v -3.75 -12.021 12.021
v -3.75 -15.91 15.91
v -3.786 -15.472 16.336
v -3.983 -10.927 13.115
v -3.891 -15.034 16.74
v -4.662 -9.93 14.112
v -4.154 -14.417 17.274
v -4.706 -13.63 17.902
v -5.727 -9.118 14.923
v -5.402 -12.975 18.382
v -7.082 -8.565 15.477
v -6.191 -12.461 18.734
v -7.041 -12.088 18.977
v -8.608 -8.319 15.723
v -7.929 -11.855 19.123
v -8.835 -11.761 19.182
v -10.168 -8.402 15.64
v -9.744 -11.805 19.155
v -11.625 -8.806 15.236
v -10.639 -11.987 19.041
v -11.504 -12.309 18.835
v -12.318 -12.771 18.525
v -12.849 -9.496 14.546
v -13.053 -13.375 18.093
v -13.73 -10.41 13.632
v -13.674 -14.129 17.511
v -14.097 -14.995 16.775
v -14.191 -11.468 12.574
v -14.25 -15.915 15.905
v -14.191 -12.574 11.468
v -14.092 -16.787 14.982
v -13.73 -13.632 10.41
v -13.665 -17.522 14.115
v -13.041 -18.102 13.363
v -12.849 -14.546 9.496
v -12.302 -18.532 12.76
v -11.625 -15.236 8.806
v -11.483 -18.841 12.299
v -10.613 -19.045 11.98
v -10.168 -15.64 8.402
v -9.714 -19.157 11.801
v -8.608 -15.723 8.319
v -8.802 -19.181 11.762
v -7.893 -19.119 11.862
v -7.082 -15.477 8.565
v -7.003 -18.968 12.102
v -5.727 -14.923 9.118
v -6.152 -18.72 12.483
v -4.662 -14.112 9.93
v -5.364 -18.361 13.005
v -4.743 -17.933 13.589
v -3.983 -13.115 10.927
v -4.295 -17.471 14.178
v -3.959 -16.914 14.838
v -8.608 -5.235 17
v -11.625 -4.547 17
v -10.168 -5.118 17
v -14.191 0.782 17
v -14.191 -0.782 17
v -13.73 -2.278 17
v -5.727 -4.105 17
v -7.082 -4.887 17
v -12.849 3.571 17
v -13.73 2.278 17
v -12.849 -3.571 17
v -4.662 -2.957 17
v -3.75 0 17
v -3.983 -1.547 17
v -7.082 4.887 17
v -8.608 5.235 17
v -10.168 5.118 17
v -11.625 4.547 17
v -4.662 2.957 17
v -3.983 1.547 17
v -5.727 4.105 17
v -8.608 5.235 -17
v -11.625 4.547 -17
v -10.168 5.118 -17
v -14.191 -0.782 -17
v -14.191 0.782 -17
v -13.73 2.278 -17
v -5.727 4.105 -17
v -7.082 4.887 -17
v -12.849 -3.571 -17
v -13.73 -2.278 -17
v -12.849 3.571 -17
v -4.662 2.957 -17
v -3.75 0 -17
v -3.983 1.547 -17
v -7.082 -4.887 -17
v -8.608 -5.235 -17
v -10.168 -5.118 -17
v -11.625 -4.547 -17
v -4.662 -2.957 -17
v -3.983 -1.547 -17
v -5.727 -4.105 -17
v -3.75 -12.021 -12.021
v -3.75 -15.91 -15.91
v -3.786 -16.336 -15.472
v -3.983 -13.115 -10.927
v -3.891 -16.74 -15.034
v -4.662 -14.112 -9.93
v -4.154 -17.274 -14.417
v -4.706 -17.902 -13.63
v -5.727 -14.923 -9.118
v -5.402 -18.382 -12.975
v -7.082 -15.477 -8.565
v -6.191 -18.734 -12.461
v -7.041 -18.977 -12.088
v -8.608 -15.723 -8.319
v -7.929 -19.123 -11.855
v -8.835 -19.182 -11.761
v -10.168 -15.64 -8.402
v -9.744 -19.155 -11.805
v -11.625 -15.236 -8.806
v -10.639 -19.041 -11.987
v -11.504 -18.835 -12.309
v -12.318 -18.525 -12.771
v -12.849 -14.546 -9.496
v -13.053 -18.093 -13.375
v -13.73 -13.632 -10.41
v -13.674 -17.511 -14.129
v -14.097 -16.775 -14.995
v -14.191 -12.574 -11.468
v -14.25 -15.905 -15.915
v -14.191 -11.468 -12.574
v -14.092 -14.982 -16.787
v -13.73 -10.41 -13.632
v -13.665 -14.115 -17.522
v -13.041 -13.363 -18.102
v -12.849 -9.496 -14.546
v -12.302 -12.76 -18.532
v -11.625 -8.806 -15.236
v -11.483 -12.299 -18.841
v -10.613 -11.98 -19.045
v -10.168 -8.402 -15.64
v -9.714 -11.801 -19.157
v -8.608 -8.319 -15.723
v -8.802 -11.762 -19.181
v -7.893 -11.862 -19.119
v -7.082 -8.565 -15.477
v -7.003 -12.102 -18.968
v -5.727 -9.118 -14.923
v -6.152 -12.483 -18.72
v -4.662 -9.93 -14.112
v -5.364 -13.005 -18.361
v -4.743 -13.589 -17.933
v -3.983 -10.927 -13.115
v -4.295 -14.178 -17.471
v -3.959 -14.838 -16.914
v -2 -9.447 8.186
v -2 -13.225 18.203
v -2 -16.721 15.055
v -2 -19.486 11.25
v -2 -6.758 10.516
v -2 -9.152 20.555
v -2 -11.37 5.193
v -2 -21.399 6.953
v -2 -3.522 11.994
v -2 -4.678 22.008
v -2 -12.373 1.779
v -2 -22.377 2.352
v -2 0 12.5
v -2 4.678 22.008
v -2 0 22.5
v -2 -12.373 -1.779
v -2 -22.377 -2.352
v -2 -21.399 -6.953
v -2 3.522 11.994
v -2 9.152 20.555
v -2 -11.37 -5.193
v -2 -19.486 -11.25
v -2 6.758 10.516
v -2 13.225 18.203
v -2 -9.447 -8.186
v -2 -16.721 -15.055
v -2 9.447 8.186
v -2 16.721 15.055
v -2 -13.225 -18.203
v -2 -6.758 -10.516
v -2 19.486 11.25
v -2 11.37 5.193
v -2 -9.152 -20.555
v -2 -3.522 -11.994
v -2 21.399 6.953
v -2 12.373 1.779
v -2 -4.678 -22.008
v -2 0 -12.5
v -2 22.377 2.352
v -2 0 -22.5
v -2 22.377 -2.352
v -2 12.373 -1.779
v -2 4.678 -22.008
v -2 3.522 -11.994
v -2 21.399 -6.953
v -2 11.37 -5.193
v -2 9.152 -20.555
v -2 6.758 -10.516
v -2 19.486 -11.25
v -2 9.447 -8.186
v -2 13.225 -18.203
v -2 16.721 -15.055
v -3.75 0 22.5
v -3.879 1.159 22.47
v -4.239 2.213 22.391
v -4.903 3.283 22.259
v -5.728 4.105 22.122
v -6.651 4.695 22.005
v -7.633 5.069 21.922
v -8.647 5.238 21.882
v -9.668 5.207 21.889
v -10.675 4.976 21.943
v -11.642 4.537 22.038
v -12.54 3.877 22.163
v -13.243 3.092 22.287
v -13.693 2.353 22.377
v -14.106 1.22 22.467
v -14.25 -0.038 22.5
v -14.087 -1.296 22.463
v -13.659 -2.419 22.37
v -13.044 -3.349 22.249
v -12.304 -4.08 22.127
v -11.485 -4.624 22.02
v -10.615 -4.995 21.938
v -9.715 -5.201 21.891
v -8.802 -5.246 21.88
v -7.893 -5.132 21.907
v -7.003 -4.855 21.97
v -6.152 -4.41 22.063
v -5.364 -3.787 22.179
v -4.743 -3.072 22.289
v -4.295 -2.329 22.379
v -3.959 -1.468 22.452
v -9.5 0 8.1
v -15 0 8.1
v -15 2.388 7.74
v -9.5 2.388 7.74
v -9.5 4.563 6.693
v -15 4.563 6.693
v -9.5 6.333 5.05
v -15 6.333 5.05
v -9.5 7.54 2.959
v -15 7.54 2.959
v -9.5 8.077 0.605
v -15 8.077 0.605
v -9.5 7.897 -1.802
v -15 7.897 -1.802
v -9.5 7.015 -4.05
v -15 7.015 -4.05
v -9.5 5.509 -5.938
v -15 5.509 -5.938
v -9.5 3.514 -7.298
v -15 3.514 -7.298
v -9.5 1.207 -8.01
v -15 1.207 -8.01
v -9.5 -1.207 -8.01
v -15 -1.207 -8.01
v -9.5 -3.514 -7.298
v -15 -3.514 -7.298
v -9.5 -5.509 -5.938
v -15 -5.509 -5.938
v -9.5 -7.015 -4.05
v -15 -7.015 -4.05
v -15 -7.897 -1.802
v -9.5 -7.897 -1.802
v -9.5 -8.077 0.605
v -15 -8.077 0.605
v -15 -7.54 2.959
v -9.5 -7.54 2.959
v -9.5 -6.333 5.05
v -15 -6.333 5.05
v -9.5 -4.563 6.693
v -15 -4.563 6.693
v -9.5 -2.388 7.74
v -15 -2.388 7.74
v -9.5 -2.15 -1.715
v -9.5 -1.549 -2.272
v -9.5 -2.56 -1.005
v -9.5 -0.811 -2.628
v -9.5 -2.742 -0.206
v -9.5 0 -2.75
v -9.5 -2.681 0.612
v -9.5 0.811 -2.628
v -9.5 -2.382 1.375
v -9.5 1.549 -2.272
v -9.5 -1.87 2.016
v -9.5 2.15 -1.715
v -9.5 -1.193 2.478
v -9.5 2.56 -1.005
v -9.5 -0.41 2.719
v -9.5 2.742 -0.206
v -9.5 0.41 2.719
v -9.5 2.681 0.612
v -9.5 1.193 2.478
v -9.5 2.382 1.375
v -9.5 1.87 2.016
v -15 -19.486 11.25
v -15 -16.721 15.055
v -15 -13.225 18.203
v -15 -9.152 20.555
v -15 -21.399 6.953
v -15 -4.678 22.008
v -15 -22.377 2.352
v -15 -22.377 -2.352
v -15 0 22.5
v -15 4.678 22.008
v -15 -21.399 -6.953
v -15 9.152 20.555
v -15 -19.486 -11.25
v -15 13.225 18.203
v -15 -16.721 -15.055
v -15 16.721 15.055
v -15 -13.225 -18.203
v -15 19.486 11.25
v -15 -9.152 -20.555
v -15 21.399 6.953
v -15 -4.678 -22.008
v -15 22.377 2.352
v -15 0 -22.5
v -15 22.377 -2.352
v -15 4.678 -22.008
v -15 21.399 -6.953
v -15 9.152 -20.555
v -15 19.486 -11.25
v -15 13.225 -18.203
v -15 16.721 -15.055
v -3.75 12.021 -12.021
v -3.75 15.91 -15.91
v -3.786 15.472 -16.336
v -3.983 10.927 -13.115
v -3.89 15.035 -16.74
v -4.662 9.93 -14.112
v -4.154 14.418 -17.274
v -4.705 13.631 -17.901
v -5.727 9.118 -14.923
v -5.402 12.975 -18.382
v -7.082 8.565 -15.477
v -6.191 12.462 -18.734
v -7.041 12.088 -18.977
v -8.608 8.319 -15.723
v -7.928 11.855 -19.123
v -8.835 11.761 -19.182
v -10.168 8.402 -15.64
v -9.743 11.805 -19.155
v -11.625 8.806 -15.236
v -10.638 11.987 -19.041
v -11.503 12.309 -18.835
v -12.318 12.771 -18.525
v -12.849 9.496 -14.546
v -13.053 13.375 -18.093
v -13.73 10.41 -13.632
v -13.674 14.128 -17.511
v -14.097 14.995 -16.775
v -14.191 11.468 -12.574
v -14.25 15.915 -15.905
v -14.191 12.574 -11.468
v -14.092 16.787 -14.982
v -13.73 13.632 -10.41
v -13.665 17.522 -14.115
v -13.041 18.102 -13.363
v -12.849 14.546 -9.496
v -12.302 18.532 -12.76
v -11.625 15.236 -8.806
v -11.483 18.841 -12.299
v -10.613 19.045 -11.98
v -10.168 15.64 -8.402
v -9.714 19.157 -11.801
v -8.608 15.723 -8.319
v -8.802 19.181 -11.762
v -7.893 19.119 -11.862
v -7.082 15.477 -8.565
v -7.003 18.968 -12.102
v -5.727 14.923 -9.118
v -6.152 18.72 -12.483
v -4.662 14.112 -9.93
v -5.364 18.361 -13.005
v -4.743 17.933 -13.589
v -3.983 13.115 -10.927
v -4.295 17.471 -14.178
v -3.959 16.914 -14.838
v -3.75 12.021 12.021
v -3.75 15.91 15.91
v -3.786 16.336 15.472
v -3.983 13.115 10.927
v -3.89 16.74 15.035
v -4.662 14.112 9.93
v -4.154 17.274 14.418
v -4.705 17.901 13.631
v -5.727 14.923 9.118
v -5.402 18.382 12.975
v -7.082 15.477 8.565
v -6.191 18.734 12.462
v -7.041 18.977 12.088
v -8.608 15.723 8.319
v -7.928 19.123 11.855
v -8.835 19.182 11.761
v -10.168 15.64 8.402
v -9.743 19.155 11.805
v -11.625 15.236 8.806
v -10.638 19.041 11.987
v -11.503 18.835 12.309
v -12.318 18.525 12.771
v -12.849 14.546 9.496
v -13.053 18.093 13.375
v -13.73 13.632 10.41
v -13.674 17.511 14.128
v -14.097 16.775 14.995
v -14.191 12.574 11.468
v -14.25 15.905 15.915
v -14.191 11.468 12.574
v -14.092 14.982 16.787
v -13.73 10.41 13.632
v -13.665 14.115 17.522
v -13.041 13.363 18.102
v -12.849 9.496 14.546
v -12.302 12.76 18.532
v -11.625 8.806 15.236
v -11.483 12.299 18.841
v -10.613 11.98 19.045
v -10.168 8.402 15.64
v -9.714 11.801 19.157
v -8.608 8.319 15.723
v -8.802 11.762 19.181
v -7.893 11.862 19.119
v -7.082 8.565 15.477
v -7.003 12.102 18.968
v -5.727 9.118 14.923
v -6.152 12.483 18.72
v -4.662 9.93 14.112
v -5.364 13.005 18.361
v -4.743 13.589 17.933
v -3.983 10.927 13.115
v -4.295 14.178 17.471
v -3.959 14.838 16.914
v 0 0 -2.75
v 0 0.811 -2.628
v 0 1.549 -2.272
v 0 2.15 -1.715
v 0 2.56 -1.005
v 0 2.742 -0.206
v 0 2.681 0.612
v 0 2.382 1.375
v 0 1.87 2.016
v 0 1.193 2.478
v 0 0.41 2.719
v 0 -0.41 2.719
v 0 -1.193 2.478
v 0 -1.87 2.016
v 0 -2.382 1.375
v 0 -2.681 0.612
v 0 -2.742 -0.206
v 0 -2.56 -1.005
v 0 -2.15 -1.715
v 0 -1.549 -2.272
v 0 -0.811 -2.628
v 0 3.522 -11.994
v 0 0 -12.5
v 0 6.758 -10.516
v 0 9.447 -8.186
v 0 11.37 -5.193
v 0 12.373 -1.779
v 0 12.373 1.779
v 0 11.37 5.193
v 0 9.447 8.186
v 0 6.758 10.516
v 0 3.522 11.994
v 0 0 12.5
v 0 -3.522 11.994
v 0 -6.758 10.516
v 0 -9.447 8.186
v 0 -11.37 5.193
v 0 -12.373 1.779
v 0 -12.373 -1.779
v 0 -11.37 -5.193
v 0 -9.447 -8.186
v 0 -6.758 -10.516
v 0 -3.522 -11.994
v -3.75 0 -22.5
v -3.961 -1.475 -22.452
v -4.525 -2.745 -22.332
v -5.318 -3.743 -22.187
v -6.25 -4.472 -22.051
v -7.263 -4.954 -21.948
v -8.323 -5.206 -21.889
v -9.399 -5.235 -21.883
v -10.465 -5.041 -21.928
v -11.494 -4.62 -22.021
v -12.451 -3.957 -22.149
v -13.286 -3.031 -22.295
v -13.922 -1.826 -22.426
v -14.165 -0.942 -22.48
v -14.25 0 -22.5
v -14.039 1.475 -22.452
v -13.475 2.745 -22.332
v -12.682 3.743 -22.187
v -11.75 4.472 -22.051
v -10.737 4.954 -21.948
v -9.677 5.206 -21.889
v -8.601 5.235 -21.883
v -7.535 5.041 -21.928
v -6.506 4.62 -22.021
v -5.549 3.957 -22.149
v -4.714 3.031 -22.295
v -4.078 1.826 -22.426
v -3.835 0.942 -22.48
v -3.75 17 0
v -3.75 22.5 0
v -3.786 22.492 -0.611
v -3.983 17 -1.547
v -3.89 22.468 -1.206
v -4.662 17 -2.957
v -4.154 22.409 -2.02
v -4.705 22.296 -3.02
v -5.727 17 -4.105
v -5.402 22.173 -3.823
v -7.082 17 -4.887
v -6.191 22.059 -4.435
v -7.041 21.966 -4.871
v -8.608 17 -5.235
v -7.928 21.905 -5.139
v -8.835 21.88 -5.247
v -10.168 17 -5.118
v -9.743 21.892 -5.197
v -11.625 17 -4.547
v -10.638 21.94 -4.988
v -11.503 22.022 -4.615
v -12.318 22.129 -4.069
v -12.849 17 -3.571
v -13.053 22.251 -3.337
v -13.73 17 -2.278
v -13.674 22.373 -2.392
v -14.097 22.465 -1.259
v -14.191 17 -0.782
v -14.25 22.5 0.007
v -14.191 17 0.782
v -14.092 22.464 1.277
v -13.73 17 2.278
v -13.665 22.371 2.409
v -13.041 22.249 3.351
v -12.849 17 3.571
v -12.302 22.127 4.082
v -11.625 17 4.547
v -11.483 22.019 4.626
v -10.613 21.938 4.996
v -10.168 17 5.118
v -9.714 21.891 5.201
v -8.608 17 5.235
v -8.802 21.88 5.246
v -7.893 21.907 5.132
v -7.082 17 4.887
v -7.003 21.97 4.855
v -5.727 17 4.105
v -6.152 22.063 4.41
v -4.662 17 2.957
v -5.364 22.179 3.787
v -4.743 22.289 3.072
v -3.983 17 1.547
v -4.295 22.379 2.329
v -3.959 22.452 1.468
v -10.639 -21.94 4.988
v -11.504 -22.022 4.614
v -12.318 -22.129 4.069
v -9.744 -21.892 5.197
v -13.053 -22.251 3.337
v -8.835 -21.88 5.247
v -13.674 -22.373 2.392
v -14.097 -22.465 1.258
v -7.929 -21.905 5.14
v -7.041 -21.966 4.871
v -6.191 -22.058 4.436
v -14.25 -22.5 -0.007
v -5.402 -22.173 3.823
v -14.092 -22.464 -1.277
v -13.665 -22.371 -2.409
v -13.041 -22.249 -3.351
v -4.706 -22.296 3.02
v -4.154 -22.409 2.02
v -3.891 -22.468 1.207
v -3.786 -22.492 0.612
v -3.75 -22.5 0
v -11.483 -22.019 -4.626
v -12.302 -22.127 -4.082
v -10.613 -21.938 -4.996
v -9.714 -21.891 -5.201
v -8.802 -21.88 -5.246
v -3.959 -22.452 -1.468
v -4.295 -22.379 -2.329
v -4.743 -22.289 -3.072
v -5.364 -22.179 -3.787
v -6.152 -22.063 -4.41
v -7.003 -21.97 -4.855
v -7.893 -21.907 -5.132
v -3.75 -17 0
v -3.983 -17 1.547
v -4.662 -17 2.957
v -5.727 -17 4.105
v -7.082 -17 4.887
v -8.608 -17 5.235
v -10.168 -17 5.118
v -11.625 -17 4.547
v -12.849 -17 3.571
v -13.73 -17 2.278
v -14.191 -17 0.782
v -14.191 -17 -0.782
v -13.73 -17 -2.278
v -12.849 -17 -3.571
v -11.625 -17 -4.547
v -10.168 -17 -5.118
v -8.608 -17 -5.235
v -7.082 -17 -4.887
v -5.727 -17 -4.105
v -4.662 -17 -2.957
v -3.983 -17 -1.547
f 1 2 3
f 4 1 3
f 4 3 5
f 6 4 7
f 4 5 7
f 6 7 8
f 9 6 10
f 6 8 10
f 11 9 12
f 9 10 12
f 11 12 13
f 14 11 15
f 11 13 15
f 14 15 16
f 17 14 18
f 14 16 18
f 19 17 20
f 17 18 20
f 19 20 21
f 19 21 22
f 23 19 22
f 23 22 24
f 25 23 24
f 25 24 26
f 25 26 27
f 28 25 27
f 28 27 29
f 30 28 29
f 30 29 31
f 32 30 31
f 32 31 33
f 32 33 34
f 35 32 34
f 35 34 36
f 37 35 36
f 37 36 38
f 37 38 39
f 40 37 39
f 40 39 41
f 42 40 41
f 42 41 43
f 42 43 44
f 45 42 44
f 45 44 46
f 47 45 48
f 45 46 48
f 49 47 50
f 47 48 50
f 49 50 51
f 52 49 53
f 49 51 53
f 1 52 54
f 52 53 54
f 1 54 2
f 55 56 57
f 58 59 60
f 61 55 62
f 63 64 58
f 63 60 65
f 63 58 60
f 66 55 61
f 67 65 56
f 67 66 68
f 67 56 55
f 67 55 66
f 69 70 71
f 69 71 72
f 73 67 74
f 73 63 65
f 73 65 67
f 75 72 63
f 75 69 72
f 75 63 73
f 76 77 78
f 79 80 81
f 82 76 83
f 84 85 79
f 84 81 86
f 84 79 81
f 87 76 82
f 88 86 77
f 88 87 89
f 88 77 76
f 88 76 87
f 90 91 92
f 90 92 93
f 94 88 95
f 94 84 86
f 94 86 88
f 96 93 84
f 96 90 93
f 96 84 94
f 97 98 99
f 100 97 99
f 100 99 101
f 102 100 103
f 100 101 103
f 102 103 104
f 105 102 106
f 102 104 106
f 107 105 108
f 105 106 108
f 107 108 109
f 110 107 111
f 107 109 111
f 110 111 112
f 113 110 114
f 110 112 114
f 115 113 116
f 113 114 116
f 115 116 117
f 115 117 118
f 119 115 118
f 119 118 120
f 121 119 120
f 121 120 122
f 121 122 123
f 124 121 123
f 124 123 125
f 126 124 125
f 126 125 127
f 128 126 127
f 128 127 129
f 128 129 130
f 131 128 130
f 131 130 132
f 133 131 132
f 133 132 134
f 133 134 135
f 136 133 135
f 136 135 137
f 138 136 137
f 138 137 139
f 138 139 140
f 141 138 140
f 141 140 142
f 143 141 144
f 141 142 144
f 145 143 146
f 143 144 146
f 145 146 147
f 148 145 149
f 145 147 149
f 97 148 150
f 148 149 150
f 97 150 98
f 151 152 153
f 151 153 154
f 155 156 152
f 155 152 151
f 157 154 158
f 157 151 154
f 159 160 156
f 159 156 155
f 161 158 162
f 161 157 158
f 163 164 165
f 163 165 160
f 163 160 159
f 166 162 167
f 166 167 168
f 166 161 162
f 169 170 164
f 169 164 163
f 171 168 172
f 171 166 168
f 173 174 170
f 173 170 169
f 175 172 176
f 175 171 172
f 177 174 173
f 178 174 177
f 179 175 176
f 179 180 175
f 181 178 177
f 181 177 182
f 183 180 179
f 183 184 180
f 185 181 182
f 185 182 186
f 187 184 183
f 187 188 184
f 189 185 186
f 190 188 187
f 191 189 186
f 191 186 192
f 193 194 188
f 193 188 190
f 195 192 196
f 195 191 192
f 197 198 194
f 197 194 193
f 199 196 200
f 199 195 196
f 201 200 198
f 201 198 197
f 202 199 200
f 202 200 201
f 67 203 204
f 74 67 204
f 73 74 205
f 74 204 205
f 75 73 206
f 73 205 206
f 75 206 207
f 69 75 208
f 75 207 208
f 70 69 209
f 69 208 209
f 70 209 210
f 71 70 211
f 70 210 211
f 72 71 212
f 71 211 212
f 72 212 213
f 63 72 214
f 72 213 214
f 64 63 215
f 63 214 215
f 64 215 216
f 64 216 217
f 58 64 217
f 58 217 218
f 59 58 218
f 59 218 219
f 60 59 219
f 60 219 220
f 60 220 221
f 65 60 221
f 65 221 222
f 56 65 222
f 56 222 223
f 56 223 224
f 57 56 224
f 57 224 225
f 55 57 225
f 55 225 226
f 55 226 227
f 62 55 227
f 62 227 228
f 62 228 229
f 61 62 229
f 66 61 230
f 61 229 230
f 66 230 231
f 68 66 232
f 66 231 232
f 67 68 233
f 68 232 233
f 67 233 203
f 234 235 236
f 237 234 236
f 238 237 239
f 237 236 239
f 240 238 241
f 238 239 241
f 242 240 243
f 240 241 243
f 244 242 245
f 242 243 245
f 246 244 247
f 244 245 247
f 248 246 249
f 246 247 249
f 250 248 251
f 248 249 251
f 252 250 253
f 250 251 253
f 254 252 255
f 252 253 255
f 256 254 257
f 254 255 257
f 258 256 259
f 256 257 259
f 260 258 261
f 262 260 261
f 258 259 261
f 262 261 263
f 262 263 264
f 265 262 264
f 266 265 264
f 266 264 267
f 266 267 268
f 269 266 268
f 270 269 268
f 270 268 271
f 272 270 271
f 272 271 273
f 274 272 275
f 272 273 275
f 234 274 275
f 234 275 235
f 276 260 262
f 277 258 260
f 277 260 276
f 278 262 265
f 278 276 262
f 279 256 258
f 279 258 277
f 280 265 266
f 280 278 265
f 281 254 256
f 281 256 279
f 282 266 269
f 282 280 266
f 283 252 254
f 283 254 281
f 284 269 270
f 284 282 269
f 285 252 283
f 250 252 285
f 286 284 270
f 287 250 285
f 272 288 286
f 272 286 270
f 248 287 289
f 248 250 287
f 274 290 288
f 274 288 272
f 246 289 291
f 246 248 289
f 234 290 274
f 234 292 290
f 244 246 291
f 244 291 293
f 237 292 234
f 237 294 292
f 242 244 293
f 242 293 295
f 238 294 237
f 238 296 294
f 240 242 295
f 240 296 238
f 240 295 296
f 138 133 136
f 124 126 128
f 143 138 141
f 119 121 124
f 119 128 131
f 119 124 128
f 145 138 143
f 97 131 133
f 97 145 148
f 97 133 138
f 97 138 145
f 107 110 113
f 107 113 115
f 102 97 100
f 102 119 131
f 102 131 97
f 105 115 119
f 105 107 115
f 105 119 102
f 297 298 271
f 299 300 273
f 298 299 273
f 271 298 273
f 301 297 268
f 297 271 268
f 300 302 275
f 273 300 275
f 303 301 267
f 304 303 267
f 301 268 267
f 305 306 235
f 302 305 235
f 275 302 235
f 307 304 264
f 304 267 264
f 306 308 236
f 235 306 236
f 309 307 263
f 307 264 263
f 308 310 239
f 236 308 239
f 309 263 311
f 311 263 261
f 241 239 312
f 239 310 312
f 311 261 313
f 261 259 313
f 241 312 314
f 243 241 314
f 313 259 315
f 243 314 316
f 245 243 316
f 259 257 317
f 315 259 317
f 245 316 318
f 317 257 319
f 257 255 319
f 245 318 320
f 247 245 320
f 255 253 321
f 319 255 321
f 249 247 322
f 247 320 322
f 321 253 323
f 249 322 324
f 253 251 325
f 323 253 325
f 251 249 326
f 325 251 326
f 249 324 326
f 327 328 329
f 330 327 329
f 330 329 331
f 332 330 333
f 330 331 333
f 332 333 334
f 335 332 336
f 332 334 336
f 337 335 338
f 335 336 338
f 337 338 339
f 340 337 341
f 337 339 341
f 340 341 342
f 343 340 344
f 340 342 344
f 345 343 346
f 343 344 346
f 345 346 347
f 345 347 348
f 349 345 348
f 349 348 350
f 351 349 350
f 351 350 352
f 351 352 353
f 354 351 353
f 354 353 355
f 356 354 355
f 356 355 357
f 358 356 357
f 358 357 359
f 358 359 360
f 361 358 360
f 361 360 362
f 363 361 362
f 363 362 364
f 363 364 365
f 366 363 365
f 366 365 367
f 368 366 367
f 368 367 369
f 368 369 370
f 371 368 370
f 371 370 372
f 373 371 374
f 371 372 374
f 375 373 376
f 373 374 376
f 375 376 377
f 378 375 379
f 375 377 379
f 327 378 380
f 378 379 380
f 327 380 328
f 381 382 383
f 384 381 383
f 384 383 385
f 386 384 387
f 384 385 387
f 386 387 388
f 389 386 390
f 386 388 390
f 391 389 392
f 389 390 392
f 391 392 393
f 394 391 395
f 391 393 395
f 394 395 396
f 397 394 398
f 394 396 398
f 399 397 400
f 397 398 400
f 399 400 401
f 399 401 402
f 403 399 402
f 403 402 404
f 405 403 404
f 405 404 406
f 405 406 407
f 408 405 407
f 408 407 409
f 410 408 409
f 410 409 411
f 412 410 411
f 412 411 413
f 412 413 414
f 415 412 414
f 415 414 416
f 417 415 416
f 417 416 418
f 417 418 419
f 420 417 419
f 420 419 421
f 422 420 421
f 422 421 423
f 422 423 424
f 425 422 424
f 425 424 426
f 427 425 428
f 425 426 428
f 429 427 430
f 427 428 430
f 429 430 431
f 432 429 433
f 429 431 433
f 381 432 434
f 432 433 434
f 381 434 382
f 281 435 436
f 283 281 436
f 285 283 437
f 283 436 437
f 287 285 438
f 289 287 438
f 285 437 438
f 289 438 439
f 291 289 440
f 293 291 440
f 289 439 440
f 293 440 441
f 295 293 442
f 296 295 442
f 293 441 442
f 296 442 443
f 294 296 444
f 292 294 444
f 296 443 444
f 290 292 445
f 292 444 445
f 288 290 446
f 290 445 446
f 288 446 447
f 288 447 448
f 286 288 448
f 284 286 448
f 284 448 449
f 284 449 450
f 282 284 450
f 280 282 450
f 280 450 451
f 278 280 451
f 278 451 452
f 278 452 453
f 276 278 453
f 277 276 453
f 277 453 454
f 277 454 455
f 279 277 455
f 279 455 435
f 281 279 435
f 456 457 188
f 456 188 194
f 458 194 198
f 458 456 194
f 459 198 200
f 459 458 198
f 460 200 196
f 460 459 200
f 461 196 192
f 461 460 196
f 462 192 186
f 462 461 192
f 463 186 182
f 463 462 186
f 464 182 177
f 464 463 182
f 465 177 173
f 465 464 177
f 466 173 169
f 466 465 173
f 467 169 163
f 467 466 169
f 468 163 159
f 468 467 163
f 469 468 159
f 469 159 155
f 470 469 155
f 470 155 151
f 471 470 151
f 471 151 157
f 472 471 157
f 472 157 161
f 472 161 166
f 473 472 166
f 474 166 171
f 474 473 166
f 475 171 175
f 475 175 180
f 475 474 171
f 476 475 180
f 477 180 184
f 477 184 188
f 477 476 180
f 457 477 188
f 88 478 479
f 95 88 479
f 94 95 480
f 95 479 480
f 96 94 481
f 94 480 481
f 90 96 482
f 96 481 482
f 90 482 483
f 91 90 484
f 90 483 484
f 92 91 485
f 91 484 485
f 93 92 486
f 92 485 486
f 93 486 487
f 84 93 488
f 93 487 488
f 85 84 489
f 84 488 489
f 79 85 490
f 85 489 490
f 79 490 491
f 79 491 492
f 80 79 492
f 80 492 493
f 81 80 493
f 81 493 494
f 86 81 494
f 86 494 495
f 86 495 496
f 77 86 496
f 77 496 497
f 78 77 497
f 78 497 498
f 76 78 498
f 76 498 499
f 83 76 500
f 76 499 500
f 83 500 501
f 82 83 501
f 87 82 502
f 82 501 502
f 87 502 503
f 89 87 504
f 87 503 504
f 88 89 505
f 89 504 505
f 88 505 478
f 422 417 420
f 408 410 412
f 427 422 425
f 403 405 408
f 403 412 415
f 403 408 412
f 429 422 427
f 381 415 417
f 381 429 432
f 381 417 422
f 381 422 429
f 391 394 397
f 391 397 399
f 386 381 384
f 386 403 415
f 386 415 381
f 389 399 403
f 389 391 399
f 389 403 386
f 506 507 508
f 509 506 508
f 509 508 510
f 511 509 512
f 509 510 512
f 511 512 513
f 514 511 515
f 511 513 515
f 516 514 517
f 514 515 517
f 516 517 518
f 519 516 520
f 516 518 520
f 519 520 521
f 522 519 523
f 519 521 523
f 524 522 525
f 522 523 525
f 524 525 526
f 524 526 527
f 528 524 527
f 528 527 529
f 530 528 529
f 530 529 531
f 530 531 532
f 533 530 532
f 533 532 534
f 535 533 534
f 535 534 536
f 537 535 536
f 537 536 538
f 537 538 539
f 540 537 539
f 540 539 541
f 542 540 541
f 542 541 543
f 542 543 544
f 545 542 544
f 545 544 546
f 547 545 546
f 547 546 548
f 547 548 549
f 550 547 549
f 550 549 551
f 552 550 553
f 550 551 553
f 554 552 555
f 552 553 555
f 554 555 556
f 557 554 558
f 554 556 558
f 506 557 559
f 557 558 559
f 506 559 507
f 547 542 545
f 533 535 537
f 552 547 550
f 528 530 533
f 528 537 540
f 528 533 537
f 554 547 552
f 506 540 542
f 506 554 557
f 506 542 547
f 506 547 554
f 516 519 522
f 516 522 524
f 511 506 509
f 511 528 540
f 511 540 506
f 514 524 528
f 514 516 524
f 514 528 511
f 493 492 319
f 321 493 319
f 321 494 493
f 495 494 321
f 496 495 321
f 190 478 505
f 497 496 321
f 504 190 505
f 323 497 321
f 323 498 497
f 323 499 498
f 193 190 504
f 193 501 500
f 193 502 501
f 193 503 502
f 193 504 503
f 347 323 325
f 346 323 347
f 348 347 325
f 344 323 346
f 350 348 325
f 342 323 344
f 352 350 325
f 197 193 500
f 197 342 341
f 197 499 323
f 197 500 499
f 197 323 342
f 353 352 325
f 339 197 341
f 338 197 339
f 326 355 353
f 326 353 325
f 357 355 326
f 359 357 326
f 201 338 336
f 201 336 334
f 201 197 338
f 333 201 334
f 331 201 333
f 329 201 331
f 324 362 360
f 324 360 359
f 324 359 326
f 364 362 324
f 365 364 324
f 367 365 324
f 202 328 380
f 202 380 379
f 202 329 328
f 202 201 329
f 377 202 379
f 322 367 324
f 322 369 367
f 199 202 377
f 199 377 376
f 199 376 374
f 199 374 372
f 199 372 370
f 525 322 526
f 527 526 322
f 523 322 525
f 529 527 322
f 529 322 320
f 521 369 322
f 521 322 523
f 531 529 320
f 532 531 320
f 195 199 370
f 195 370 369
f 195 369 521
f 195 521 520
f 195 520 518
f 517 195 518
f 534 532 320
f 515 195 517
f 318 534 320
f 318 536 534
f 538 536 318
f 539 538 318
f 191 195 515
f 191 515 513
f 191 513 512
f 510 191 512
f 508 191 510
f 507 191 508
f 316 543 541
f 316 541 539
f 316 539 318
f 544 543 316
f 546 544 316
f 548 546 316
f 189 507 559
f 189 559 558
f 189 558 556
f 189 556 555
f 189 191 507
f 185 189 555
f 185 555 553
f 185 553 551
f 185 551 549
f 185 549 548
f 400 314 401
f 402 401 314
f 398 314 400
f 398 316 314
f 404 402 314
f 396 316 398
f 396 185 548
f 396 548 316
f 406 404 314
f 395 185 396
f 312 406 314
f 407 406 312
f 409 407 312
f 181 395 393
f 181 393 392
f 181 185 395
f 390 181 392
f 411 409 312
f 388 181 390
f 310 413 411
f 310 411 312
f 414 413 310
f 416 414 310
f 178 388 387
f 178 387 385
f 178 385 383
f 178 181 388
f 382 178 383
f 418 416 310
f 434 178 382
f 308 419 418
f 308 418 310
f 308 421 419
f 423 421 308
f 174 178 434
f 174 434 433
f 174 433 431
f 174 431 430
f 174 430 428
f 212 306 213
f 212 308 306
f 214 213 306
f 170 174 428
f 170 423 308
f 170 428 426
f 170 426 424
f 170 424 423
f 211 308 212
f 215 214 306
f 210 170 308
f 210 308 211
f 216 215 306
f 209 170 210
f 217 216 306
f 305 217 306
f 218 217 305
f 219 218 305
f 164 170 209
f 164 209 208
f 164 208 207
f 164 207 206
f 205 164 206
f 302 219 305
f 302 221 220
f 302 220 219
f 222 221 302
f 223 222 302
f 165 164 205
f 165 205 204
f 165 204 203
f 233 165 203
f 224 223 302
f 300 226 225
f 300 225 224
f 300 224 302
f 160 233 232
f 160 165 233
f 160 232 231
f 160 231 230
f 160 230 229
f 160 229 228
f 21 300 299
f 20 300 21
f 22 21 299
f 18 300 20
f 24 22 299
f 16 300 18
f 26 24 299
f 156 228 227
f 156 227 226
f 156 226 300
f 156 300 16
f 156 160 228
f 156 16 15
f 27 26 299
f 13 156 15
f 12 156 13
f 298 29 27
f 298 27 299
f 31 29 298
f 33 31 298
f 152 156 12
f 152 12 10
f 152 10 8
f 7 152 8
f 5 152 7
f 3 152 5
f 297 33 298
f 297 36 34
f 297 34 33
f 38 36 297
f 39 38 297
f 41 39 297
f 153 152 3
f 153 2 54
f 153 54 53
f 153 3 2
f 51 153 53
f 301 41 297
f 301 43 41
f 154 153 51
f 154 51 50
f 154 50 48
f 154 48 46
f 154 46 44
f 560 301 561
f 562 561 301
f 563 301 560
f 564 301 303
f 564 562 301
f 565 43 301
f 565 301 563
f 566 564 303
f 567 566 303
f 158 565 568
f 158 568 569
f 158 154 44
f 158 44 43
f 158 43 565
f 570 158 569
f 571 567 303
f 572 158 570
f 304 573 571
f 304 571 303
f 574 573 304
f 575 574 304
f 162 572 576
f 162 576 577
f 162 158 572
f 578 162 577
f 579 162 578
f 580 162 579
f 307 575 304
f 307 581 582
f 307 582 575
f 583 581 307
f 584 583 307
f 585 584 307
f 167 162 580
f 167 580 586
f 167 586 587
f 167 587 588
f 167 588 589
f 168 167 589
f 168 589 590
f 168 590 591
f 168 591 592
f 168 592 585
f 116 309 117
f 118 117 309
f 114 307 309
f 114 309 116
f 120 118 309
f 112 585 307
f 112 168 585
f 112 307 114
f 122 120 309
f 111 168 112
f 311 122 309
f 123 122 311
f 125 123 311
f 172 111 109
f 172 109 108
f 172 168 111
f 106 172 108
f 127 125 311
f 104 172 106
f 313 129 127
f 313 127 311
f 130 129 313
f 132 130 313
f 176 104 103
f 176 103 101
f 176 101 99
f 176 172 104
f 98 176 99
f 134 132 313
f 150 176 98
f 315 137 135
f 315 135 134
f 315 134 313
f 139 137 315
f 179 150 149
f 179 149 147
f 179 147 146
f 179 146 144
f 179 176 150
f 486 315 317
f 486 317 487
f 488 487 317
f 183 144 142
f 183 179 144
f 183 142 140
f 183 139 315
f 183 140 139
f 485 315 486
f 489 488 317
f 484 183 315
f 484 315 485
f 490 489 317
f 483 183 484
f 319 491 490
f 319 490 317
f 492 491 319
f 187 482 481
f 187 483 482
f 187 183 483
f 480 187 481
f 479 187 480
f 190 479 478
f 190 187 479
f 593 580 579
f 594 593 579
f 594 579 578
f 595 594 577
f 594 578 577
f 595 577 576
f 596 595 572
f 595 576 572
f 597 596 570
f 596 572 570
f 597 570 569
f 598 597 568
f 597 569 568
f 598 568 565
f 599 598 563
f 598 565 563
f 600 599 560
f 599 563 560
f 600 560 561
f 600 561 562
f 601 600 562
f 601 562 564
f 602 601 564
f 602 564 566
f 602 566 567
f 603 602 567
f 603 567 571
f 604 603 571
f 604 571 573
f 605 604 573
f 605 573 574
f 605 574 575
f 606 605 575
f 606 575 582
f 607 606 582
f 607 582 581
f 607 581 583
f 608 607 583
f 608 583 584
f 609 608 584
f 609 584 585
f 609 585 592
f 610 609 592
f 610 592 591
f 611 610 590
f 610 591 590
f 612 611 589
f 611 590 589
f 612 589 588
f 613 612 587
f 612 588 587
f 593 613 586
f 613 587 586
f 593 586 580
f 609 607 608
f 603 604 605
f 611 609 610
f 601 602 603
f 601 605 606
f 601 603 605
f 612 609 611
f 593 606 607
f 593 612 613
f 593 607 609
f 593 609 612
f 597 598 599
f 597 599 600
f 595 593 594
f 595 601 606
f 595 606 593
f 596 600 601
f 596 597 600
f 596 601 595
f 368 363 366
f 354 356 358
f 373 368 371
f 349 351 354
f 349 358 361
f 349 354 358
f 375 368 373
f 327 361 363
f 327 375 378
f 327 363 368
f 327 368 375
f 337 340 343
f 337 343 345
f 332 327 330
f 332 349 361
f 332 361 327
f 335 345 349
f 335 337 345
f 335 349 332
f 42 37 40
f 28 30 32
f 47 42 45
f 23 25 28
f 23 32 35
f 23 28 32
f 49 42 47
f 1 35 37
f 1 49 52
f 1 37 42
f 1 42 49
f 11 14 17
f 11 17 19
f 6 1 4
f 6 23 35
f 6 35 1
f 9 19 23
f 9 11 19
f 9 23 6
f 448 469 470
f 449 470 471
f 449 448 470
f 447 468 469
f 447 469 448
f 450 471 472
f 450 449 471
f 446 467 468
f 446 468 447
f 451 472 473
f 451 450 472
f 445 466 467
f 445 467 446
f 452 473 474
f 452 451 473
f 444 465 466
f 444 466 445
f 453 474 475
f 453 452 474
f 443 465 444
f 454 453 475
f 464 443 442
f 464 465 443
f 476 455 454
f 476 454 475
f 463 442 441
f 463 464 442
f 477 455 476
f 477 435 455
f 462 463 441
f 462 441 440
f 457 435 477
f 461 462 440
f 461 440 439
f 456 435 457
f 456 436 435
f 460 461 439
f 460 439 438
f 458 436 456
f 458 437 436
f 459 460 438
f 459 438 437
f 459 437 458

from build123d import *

# Parameters (mm, degrees)
SKETCH1_R               = 22.5
BOSS_EXTRUDE1_DEPTH     = 15
SKETCH2_R               = 2.75
CUT_EXTRUDE1_DEPTH      = 36.178118199
SKETCH5_R               = 8.1
CUT_EXTRUDE2_DEPTH      = 5.5
SKETCH6_R               = 5.25
CUT_EXTRUDE3_DEPTH      = 5.5
CIRPATTERN1_COUNT       = 8
SKETCH29_R              = 22.5
SKETCH29_R_2            = 12.5
CUT_EXTRUDE_THIN1_DEPTH = 2


with BuildPart() as part:
    # Sketch1 → Boss-Extrude1 (new body)
    with BuildSketch(Plane(origin=(0, 0, 0), x_dir=(0, 0, -1), z_dir=(1, 0, 0))):
        Circle(SKETCH1_R)
    extrude(amount=-BOSS_EXTRUDE1_DEPTH)

    # Sketch2 → Cut-Extrude1 (cut, through all)
    with BuildSketch(Plane(origin=(0, 0, 0), x_dir=(0, 0, -1), z_dir=(1, 0, 0))):
        Circle(SKETCH2_R)
    extrude(amount=-CUT_EXTRUDE1_DEPTH, mode=Mode.SUBTRACT)

    # Sketch5 → Cut-Extrude2 (cut)
    with BuildSketch(Plane.ZY.offset(15)):
        Circle(SKETCH5_R)
    extrude(amount=-CUT_EXTRUDE2_DEPTH, mode=Mode.SUBTRACT)

    # Sketch6 → Cut-Extrude3 (cut)
    with BuildSketch(Plane.XY.offset(22.5)):
        with Locations((-9, 0)):
            Circle(SKETCH6_R)
    cut_extrude3 = extrude(amount=-CUT_EXTRUDE3_DEPTH, mode=Mode.SUBTRACT)

    # CirPattern1: Cut-Extrude3 ×8 about axis
    cirpattern1_axis = Axis((0, 0, 0), (1, 0, 0))
    for i in range(1, CIRPATTERN1_COUNT):
        add(cut_extrude3.rotate(cirpattern1_axis, i * 360 / CIRPATTERN1_COUNT), mode=Mode.SUBTRACT)

    # Sketch29 → Cut-Extrude-Thin1 (cut)
    with BuildSketch(Plane(origin=(0, 0, 0), x_dir=(0, 0, -1), z_dir=(1, 0, 0))):
        Circle(SKETCH29_R)
        Circle(SKETCH29_R_2, mode=Mode.SUBTRACT)
    extrude(amount=-CUT_EXTRUDE_THIN1_DEPTH, mode=Mode.SUBTRACT)


solid = part.part
